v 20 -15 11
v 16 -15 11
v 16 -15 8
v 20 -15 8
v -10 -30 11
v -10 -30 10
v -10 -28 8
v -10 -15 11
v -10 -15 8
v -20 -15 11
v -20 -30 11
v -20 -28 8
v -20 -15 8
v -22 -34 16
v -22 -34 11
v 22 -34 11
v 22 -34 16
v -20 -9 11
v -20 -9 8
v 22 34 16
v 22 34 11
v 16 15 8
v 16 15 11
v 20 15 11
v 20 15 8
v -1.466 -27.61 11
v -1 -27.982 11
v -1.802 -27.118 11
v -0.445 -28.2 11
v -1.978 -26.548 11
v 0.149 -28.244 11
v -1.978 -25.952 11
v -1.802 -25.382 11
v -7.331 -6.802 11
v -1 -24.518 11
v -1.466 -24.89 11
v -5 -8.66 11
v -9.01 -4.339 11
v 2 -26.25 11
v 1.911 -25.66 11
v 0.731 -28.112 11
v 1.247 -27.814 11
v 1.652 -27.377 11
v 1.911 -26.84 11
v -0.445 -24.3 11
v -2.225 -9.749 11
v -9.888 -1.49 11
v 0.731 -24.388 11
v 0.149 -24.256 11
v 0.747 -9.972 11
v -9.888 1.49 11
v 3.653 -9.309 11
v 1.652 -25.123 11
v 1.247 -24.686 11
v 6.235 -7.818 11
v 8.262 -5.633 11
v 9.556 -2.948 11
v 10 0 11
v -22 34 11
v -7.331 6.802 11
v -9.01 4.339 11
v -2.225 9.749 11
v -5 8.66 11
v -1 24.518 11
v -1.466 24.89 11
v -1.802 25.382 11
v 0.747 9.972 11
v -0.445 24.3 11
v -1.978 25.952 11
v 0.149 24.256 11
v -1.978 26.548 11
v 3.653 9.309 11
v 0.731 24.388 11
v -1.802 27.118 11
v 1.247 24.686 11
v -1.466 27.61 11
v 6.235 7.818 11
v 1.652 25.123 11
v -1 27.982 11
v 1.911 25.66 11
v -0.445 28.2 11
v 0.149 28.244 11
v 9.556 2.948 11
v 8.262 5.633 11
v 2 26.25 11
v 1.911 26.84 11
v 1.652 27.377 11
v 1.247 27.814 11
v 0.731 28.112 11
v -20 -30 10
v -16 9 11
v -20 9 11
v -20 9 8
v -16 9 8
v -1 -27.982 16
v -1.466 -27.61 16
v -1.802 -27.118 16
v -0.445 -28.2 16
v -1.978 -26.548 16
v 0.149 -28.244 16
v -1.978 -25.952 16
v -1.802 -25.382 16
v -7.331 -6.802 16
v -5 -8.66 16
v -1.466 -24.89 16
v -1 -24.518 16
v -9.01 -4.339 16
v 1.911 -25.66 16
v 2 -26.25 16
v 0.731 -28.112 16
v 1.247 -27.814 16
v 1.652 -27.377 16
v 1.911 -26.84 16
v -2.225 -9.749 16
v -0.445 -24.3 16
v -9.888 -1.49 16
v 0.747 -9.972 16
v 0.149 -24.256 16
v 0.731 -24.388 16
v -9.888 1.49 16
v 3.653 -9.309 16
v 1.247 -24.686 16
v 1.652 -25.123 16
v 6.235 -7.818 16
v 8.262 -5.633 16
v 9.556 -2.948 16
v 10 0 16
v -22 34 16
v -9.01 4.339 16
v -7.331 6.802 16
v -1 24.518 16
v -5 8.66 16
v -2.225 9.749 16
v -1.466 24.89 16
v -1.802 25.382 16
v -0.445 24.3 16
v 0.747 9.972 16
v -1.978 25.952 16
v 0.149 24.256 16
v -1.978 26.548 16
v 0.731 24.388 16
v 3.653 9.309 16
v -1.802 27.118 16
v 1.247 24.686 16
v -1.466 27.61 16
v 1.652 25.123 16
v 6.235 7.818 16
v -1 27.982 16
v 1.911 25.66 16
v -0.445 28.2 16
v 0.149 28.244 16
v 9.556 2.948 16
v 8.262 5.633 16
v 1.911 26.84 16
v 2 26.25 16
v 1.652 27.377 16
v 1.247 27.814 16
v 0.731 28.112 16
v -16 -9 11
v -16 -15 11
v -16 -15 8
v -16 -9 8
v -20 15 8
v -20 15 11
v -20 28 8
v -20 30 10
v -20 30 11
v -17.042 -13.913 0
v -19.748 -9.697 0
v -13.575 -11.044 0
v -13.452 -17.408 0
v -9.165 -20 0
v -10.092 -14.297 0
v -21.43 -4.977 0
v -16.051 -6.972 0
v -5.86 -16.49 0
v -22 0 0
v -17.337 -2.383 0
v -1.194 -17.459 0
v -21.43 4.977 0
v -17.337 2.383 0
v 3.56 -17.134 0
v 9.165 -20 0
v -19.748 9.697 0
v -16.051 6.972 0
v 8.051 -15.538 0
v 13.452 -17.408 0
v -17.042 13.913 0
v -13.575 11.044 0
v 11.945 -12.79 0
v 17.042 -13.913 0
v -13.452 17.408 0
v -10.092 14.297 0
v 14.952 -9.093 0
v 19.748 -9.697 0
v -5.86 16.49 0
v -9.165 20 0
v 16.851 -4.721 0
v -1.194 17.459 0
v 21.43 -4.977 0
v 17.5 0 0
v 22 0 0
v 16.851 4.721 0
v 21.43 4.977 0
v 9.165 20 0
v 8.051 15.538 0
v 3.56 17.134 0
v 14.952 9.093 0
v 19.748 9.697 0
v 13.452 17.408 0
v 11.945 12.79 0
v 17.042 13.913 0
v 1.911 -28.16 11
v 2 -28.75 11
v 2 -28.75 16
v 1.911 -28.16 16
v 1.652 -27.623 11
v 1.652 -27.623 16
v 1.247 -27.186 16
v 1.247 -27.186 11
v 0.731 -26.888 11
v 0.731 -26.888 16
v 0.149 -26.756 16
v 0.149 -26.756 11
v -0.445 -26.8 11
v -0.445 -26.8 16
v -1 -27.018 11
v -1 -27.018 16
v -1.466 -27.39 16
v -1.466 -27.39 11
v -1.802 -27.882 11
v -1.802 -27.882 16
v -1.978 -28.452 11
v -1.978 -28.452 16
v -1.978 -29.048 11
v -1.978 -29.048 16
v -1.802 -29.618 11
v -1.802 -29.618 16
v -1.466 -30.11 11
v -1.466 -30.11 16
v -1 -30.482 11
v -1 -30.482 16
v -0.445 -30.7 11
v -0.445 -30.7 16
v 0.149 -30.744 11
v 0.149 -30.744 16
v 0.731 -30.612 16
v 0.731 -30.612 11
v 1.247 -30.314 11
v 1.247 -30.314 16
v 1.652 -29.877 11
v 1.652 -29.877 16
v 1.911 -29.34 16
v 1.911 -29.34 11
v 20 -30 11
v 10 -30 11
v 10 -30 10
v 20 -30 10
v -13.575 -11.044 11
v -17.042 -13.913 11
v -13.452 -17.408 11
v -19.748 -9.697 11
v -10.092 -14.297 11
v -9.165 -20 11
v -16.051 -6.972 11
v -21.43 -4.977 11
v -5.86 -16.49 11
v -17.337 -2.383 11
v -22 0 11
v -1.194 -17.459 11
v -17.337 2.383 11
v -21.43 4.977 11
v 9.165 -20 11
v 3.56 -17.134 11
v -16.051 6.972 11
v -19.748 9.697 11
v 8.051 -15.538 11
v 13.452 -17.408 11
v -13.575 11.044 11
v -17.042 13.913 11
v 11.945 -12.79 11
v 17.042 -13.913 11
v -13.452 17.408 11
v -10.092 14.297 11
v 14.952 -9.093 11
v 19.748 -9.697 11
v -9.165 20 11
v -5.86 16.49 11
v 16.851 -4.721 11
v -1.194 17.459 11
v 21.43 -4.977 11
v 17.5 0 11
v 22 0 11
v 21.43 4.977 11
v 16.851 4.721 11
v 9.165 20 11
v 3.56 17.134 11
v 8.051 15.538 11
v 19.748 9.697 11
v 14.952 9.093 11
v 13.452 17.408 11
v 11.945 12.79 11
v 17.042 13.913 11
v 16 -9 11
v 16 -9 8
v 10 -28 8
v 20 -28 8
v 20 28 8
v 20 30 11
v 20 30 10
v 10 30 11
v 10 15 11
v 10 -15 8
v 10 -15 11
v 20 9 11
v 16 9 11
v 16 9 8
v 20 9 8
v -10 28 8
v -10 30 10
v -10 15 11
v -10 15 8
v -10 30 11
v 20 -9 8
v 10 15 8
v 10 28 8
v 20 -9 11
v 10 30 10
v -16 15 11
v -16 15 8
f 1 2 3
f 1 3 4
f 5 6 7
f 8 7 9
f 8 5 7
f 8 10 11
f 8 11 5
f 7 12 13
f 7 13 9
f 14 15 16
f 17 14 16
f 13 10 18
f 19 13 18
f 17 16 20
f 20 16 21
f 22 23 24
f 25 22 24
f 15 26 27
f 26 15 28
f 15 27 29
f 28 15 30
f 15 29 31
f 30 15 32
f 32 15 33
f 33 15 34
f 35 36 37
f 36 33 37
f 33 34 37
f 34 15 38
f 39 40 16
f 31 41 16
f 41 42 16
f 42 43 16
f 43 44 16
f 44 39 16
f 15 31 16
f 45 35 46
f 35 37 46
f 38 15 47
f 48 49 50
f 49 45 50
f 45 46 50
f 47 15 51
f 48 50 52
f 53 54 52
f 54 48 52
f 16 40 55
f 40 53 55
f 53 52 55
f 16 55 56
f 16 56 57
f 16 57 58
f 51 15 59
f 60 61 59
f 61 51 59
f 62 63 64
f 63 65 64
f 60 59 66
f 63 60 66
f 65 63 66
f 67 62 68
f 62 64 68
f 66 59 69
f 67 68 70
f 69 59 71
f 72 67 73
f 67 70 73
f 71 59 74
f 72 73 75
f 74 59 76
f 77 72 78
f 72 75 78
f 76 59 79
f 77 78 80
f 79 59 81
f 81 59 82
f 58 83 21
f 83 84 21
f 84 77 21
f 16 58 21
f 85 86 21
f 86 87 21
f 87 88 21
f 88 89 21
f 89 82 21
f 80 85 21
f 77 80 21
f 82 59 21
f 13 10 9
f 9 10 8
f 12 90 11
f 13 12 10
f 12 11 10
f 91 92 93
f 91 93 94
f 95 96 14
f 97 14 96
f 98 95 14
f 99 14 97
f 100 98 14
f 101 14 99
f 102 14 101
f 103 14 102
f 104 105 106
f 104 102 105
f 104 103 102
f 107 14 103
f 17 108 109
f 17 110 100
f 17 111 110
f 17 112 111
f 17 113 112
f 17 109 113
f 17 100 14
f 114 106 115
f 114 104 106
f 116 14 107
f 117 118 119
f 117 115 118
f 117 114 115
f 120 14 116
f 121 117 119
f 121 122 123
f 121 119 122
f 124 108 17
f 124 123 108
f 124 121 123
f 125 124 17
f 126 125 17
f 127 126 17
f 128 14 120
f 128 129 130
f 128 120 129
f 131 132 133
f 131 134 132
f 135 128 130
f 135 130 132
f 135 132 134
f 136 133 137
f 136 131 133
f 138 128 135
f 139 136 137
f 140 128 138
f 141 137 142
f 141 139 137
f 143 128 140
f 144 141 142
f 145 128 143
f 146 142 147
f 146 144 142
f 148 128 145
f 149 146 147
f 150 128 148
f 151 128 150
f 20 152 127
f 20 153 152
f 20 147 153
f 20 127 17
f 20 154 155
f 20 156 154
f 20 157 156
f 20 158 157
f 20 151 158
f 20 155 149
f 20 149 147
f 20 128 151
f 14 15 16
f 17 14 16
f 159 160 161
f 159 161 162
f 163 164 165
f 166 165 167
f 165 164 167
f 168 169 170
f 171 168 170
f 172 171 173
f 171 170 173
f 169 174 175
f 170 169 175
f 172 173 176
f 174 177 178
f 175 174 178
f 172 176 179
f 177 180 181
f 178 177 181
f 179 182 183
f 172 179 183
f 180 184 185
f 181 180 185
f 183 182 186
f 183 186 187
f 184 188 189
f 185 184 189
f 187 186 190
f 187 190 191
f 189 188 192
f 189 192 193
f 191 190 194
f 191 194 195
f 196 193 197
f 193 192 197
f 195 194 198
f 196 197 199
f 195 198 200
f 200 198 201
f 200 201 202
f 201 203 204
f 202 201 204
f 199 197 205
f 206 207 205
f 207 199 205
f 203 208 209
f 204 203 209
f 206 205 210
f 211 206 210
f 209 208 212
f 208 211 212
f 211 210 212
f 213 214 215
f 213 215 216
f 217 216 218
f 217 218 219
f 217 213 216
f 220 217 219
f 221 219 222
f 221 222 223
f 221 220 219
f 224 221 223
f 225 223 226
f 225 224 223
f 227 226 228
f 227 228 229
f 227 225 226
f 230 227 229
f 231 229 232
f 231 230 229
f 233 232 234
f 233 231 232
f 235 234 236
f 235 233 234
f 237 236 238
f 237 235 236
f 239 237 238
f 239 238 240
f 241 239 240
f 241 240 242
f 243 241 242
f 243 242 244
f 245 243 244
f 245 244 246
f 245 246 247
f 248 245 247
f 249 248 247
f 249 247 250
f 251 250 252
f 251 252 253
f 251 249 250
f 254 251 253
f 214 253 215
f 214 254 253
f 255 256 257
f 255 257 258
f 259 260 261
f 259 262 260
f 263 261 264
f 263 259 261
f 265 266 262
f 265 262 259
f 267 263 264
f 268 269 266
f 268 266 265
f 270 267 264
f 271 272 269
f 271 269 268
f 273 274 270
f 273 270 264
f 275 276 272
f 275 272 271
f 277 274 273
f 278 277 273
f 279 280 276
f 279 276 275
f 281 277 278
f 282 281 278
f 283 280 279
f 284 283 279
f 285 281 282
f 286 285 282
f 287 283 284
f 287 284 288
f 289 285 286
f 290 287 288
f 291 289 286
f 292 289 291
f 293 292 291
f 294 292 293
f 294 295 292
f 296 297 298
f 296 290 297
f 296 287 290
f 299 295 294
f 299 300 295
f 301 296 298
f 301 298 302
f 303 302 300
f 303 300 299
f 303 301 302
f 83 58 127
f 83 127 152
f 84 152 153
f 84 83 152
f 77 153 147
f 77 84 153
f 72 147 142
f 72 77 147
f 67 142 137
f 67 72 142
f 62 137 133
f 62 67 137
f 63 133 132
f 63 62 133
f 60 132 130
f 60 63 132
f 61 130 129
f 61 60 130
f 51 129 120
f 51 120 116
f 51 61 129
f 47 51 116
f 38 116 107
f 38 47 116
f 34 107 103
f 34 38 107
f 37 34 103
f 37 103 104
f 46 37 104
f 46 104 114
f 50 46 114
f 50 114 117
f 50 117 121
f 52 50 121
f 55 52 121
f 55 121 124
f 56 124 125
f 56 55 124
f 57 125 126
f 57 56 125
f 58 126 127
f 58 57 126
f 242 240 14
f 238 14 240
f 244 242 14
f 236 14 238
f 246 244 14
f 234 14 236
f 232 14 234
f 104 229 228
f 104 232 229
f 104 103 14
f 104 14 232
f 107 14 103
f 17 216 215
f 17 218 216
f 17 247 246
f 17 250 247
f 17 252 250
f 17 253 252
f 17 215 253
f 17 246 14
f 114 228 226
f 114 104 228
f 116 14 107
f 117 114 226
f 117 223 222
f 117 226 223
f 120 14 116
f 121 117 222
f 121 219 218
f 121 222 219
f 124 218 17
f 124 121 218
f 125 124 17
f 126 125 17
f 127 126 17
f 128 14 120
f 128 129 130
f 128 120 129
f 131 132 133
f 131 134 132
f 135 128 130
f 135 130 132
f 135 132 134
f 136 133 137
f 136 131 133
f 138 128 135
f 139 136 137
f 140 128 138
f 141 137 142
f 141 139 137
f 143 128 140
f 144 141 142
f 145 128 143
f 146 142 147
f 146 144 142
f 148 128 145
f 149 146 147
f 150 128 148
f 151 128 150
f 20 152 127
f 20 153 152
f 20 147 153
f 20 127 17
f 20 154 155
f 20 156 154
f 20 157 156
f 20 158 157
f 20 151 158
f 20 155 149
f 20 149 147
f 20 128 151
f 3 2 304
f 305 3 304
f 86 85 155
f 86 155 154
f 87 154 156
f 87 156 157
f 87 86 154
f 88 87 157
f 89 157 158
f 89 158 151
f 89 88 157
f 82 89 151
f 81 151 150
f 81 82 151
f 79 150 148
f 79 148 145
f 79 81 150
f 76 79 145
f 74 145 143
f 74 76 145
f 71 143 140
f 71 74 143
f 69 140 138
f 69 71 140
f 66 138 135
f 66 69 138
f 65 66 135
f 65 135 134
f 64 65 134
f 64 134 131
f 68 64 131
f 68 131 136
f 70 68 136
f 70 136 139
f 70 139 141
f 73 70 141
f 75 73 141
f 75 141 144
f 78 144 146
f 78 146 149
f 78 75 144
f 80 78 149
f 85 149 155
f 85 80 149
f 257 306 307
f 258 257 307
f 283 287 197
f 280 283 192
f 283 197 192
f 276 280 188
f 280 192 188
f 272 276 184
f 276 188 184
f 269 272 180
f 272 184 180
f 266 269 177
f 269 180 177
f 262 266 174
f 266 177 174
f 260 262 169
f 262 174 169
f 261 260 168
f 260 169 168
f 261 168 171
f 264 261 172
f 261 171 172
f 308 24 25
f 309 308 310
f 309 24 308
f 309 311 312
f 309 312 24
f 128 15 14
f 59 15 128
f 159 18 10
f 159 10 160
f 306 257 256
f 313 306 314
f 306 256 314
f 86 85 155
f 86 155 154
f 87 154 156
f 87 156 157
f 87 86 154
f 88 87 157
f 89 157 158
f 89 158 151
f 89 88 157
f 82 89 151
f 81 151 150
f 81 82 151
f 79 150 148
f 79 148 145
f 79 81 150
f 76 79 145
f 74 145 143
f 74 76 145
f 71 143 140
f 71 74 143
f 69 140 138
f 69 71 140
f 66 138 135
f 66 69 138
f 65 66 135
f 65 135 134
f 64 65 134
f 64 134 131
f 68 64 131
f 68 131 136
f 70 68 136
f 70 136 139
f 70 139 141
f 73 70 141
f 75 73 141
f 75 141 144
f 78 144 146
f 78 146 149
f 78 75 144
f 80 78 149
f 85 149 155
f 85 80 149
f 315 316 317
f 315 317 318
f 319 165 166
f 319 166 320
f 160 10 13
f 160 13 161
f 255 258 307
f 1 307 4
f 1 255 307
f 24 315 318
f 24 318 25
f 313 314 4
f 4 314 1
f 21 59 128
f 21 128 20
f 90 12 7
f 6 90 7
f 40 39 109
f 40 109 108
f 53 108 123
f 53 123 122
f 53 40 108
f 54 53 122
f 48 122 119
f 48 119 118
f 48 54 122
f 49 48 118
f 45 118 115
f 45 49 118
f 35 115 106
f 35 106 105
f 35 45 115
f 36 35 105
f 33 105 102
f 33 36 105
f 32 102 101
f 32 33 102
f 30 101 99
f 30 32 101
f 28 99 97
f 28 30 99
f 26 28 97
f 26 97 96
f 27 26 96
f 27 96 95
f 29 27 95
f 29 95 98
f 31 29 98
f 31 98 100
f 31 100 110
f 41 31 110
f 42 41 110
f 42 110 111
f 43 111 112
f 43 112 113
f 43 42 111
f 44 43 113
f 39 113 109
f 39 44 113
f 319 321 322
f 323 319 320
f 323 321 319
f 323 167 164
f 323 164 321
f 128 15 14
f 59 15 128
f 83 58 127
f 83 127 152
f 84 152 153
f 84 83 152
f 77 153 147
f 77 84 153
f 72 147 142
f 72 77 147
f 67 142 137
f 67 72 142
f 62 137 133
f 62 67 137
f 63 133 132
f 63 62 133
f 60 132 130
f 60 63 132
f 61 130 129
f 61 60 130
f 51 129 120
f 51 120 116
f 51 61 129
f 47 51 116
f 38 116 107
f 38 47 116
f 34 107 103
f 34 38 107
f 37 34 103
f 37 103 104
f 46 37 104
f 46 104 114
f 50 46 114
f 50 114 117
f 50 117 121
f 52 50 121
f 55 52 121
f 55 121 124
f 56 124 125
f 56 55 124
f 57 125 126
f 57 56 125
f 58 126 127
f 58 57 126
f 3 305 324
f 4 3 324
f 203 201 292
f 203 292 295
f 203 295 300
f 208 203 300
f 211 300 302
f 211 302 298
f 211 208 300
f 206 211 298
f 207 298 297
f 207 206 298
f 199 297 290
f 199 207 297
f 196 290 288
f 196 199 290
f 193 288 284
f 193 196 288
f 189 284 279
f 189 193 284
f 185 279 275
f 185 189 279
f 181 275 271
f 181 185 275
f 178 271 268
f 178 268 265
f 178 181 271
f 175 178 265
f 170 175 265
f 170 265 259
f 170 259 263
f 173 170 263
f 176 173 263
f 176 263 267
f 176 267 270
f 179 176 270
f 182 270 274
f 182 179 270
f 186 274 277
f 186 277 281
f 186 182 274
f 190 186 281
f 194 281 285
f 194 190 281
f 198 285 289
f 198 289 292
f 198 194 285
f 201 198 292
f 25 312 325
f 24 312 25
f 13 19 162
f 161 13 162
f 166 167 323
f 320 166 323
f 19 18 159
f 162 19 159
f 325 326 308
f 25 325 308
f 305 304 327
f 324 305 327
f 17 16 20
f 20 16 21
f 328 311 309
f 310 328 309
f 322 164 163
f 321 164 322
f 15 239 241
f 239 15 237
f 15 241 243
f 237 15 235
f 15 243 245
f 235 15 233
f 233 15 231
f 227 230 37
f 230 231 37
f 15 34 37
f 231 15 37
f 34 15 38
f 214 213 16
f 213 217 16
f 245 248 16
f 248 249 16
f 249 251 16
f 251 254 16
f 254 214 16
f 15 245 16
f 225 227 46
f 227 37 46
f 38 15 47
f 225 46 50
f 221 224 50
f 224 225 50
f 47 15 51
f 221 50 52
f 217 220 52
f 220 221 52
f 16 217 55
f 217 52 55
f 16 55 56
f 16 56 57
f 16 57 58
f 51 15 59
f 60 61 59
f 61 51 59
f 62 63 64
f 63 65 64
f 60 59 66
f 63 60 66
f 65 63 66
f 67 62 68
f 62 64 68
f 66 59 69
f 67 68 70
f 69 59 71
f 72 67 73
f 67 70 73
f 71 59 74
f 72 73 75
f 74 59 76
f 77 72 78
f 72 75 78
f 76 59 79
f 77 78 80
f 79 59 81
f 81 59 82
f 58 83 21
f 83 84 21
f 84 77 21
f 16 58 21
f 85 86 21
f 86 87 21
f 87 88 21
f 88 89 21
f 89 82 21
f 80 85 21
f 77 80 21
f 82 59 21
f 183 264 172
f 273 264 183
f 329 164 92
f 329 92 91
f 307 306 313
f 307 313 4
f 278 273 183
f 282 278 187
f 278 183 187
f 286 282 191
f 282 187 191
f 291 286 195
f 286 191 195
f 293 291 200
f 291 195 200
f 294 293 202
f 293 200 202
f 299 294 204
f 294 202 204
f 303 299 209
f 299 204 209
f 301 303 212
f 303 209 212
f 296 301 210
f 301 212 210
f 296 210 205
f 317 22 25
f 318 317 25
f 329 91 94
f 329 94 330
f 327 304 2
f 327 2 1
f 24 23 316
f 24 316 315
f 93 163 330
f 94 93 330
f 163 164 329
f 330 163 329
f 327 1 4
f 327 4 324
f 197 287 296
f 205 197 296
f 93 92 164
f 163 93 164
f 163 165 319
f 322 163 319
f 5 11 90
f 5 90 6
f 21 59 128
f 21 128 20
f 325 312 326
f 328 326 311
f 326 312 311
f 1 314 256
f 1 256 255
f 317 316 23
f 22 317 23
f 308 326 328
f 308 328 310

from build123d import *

# Parameters (mm, degrees)
RECTANGLE005_W   = 20
RECTANGLE005_H   = 6.25
EXTRUDE003_DEPTH = 11
RECTANGLE004_W   = 20
RECTANGLE004_H   = 6.25
EXTRUDE002_DEPTH = 11
CIRCLE_R         = 17.5
EXTRUDE_DEPTH    = 11
CIRCLE001_R      = 22
EXTRUDE001_DEPTH = 11
RECTANGLE010_W   = 4
RECTANGLE010_H   = 6
EXTRUDE011_DEPTH = 3
RECTANGLE011_W   = 4
RECTANGLE011_H   = 6
EXTRUDE012_DEPTH = 3
RECTANGLE012_W   = 4
RECTANGLE012_H   = 6
EXTRUDE013_DEPTH = 3
RECTANGLE013_W   = 4
RECTANGLE013_H   = 6
EXTRUDE014_DEPTH = 3
RECTANGLE006_W   = 10
RECTANGLE006_H   = 15
EXTRUDE007_DEPTH = 3
CHAMFER_SIZE     = 2
RECTANGLE008_W   = 10
RECTANGLE008_H   = 15
EXTRUDE008_DEPTH = 3
CHAMFER001_SIZE  = 2
RECTANGLE007_W   = 10
RECTANGLE007_H   = 15
EXTRUDE009_DEPTH = 3
CHAMFER002_SIZE  = 2
RECTANGLE009_W   = 10
RECTANGLE009_H   = 15
EXTRUDE010_DEPTH = 3
CHAMFER003_SIZE  = 2
CIRCLE003_R      = 2
EXTRUDE016_DEPTH = 5
CIRCLE004_R      = 2
EXTRUDE015_DEPTH = 5
CIRCLE002_R      = 10
EXTRUDE006_DEPTH = 5
RECTANGLE_W      = 44
RECTANGLE_H      = 34
EXTRUDE004_DEPTH = 5
RECTANGLE003_W   = 44
RECTANGLE003_H   = 34
EXTRUDE005_DEPTH = 5
CIRCLE007_R      = 2
EXTRUDE021_DEPTH = 5
CIRCLE006_R      = 2
EXTRUDE020_DEPTH = 5
CIRCLE005_R      = 10
EXTRUDE019_DEPTH = 5
RECTANGLE014_W   = 44
RECTANGLE014_H   = 34
EXTRUDE017_DEPTH = 5
RECTANGLE015_W   = 44
RECTANGLE015_H   = 34
EXTRUDE018_DEPTH = 5


with BuildPart() as extrude003:
    # Rectangle005 → Extrude003 (new body)
    with BuildSketch(Plane(origin=(-10, 20, 11), x_dir=(1, 0, 0), z_dir=(0, 0, 1))):
        with Locations((10, 3.125)):
            Rectangle(RECTANGLE005_W, RECTANGLE005_H)
    extrude(amount=-EXTRUDE003_DEPTH)


with BuildPart() as extrude002:
    # Rectangle004 → Extrude002 (new body)
    with BuildSketch(Plane(origin=(-10, -26.25, 11), x_dir=(1, 0, 0), z_dir=(0, 0, 1))):
        with Locations((10, 3.125)):
            Rectangle(RECTANGLE004_W, RECTANGLE004_H)
    extrude(amount=-EXTRUDE002_DEPTH)


with BuildPart() as extrude_body:
    # Circle → Extrude (new body)
    with BuildSketch(Plane.XY):
        Circle(CIRCLE_R)
    extrude(amount=EXTRUDE_DEPTH)


with BuildPart() as cut002:
    # Circle001 → Extrude001 (new body)
    with BuildSketch(Plane.XY):
        Circle(CIRCLE001_R)
    extrude(amount=EXTRUDE001_DEPTH)

    # Cut: cut Extrude body
    add(extrude_body.part, mode=Mode.SUBTRACT)

    # Cut001: cut Extrude002
    add(extrude002.part, mode=Mode.SUBTRACT)

    # Cut002: cut Extrude003
    add(extrude003.part, mode=Mode.SUBTRACT)


with BuildPart() as extrude011:
    # Rectangle010 → Extrude011 (new body)
    with BuildSketch(Plane(origin=(16, -15, 11), x_dir=(1, 0, 0), z_dir=(0, 0, 1))):
        with Locations((2, 3)):
            Rectangle(RECTANGLE010_W, RECTANGLE010_H)
    extrude(amount=-EXTRUDE011_DEPTH)


with BuildPart() as extrude012:
    # Rectangle011 → Extrude012 (new body)
    with BuildSketch(Plane(origin=(16, 9, 11), x_dir=(1, 0, 0), z_dir=(0, 0, 1))):
        with Locations((2, 3)):
            Rectangle(RECTANGLE011_W, RECTANGLE011_H)
    extrude(amount=-EXTRUDE012_DEPTH)


with BuildPart() as extrude013:
    # Rectangle012 → Extrude013 (new body)
    with BuildSketch(Plane(origin=(-20, 9, 11), x_dir=(1, 0, 0), z_dir=(0, 0, 1))):
        with Locations((2, 3)):
            Rectangle(RECTANGLE012_W, RECTANGLE012_H)
    extrude(amount=-EXTRUDE013_DEPTH)


with BuildPart() as extrude014:
    # Rectangle013 → Extrude014 (new body)
    with BuildSketch(Plane(origin=(-20, -15, 11), x_dir=(1, 0, 0), z_dir=(0, 0, 1))):
        with Locations((2, 3)):
            Rectangle(RECTANGLE013_W, RECTANGLE013_H)
    extrude(amount=-EXTRUDE014_DEPTH)


with BuildPart() as chamfer_body:
    # Rectangle006 → Extrude007 (new body)
    with BuildSketch(Plane(origin=(10, 15, 11), x_dir=(1, 0, 0), z_dir=(0, 0, 1))):
        with Locations((5, 7.5)):
            Rectangle(RECTANGLE006_W, RECTANGLE006_H)
    extrude(amount=-EXTRUDE007_DEPTH)

    # Chamfer
    chamfer_edges = [chamfer_body.edges().sort_by_distance(p)[0] for p in [
        (15, 30, 8),
    ]]
    chamfer(chamfer_edges, length=CHAMFER_SIZE)


with BuildPart() as chamfer001:
    # Rectangle008 → Extrude008 (new body)
    with BuildSketch(Plane(origin=(-20, 15, 11), x_dir=(1, 0, 0), z_dir=(0, 0, 1))):
        with Locations((5, 7.5)):
            Rectangle(RECTANGLE008_W, RECTANGLE008_H)
    extrude(amount=-EXTRUDE008_DEPTH)

    # Chamfer001
    chamfer001_edges = [chamfer001.edges().sort_by_distance(p)[0] for p in [
        (-15, 30, 8),
    ]]
    chamfer(chamfer001_edges, length=CHAMFER001_SIZE)


with BuildPart() as chamfer002:
    # Rectangle007 → Extrude009 (new body)
    with BuildSketch(Plane(origin=(10, -30, 11), x_dir=(1, 0, 0), z_dir=(0, 0, 1))):
        with Locations((5, 7.5)):
            Rectangle(RECTANGLE007_W, RECTANGLE007_H)
    extrude(amount=-EXTRUDE009_DEPTH)

    # Chamfer002
    chamfer002_edges = [chamfer002.edges().sort_by_distance(p)[0] for p in [
        (15, -30, 8),
    ]]
    chamfer(chamfer002_edges, length=CHAMFER002_SIZE)


with BuildPart() as chamfer003:
    # Rectangle009 → Extrude010 (new body)
    with BuildSketch(Plane(origin=(-20, -30, 11), x_dir=(1, 0, 0), z_dir=(0, 0, 1))):
        with Locations((5, 7.5)):
            Rectangle(RECTANGLE009_W, RECTANGLE009_H)
    extrude(amount=-EXTRUDE010_DEPTH)

    # Chamfer003
    chamfer003_edges = [chamfer003.edges().sort_by_distance(p)[0] for p in [
        (-15, -30, 8),
    ]]
    chamfer(chamfer003_edges, length=CHAMFER003_SIZE)


with BuildPart() as extrude016:
    # Circle003 → Extrude016 (new body)
    with BuildSketch(Plane(origin=(0, -26.25, 11), x_dir=(1, 0, 0), z_dir=(0, 0, 1))):
        Circle(CIRCLE003_R)
    extrude(amount=EXTRUDE016_DEPTH)


with BuildPart() as extrude015:
    # Circle004 → Extrude015 (new body)
    with BuildSketch(Plane(origin=(0, 26.25, 11), x_dir=(1, 0, 0), z_dir=(0, 0, 1))):
        Circle(CIRCLE004_R)
    extrude(amount=EXTRUDE015_DEPTH)


with BuildPart() as extrude006:
    # Circle002 → Extrude006 (new body)
    with BuildSketch(Plane.XY.offset(11)):
        Circle(CIRCLE002_R)
    extrude(amount=EXTRUDE006_DEPTH)


with BuildPart() as extrude004:
    # Rectangle → Extrude004 (new body)
    with BuildSketch(Plane(origin=(-22, -34, 11), x_dir=(1, 0, 0), z_dir=(0, 0, 1))):
        with Locations((22, 17)):
            Rectangle(RECTANGLE_W, RECTANGLE_H)
    extrude(amount=EXTRUDE004_DEPTH)


with BuildPart() as cut005:
    # Rectangle003 → Extrude005 (new body)
    with BuildSketch(Plane(origin=(-22, 0, 11), x_dir=(1, 0, 0), z_dir=(0, 0, 1))):
        with Locations((22, 17)):
            Rectangle(RECTANGLE003_W, RECTANGLE003_H)
    extrude(amount=EXTRUDE005_DEPTH)

    # Fusion: union Extrude004
    add(extrude004.part)

    # Cut003: cut Extrude006
    add(extrude006.part, mode=Mode.SUBTRACT)

    # Cut004: cut Extrude015
    add(extrude015.part, mode=Mode.SUBTRACT)

    # Cut005: cut Extrude016
    add(extrude016.part, mode=Mode.SUBTRACT)


with BuildPart() as extrude021:
    # Circle007 → Extrude021 (new body)
    with BuildSketch(Plane(origin=(0, -26.25, 11), x_dir=(1, 0, 0), z_dir=(0, 0, 1))):
        Circle(CIRCLE007_R)
    extrude(amount=EXTRUDE021_DEPTH)


with BuildPart() as extrude021_1:
    # Extrude021 placement: moved
    add(extrude021.part.moved(Location((0, -2.5, 0))))


with BuildPart() as extrude020:
    # Circle006 → Extrude020 (new body)
    with BuildSketch(Plane(origin=(0, 26.25, 11), x_dir=(1, 0, 0), z_dir=(0, 0, 1))):
        Circle(CIRCLE006_R)
    extrude(amount=EXTRUDE020_DEPTH)


with BuildPart() as extrude019:
    # Circle005 → Extrude019 (new body)
    with BuildSketch(Plane.XY.offset(11)):
        Circle(CIRCLE005_R)
    extrude(amount=EXTRUDE019_DEPTH)


with BuildPart() as extrude017:
    # Rectangle014 → Extrude017 (new body)
    with BuildSketch(Plane(origin=(-22, -34, 11), x_dir=(1, 0, 0), z_dir=(0, 0, 1))):
        with Locations((22, 17)):
            Rectangle(RECTANGLE014_W, RECTANGLE014_H)
    extrude(amount=EXTRUDE017_DEPTH)


with BuildPart() as cut008:
    # Rectangle015 → Extrude018 (new body)
    with BuildSketch(Plane(origin=(-22, 0, 11), x_dir=(1, 0, 0), z_dir=(0, 0, 1))):
        with Locations((22, 17)):
            Rectangle(RECTANGLE015_W, RECTANGLE015_H)
    extrude(amount=EXTRUDE018_DEPTH)

    # Fusion001: union Extrude017
    add(extrude017.part)

    # Cut006: cut Extrude019
    add(extrude019.part, mode=Mode.SUBTRACT)

    # Cut007: cut Extrude020
    add(extrude020.part, mode=Mode.SUBTRACT)

    # Cut008: cut Extrude021
    add(extrude021_1.part, mode=Mode.SUBTRACT)


solid = Compound([cut002.part, extrude011.part, extrude012.part, extrude013.part, extrude014.part, chamfer_body.part, chamfer001.part, chamfer002.part, chamfer003.part, cut005.part, cut008.part])
